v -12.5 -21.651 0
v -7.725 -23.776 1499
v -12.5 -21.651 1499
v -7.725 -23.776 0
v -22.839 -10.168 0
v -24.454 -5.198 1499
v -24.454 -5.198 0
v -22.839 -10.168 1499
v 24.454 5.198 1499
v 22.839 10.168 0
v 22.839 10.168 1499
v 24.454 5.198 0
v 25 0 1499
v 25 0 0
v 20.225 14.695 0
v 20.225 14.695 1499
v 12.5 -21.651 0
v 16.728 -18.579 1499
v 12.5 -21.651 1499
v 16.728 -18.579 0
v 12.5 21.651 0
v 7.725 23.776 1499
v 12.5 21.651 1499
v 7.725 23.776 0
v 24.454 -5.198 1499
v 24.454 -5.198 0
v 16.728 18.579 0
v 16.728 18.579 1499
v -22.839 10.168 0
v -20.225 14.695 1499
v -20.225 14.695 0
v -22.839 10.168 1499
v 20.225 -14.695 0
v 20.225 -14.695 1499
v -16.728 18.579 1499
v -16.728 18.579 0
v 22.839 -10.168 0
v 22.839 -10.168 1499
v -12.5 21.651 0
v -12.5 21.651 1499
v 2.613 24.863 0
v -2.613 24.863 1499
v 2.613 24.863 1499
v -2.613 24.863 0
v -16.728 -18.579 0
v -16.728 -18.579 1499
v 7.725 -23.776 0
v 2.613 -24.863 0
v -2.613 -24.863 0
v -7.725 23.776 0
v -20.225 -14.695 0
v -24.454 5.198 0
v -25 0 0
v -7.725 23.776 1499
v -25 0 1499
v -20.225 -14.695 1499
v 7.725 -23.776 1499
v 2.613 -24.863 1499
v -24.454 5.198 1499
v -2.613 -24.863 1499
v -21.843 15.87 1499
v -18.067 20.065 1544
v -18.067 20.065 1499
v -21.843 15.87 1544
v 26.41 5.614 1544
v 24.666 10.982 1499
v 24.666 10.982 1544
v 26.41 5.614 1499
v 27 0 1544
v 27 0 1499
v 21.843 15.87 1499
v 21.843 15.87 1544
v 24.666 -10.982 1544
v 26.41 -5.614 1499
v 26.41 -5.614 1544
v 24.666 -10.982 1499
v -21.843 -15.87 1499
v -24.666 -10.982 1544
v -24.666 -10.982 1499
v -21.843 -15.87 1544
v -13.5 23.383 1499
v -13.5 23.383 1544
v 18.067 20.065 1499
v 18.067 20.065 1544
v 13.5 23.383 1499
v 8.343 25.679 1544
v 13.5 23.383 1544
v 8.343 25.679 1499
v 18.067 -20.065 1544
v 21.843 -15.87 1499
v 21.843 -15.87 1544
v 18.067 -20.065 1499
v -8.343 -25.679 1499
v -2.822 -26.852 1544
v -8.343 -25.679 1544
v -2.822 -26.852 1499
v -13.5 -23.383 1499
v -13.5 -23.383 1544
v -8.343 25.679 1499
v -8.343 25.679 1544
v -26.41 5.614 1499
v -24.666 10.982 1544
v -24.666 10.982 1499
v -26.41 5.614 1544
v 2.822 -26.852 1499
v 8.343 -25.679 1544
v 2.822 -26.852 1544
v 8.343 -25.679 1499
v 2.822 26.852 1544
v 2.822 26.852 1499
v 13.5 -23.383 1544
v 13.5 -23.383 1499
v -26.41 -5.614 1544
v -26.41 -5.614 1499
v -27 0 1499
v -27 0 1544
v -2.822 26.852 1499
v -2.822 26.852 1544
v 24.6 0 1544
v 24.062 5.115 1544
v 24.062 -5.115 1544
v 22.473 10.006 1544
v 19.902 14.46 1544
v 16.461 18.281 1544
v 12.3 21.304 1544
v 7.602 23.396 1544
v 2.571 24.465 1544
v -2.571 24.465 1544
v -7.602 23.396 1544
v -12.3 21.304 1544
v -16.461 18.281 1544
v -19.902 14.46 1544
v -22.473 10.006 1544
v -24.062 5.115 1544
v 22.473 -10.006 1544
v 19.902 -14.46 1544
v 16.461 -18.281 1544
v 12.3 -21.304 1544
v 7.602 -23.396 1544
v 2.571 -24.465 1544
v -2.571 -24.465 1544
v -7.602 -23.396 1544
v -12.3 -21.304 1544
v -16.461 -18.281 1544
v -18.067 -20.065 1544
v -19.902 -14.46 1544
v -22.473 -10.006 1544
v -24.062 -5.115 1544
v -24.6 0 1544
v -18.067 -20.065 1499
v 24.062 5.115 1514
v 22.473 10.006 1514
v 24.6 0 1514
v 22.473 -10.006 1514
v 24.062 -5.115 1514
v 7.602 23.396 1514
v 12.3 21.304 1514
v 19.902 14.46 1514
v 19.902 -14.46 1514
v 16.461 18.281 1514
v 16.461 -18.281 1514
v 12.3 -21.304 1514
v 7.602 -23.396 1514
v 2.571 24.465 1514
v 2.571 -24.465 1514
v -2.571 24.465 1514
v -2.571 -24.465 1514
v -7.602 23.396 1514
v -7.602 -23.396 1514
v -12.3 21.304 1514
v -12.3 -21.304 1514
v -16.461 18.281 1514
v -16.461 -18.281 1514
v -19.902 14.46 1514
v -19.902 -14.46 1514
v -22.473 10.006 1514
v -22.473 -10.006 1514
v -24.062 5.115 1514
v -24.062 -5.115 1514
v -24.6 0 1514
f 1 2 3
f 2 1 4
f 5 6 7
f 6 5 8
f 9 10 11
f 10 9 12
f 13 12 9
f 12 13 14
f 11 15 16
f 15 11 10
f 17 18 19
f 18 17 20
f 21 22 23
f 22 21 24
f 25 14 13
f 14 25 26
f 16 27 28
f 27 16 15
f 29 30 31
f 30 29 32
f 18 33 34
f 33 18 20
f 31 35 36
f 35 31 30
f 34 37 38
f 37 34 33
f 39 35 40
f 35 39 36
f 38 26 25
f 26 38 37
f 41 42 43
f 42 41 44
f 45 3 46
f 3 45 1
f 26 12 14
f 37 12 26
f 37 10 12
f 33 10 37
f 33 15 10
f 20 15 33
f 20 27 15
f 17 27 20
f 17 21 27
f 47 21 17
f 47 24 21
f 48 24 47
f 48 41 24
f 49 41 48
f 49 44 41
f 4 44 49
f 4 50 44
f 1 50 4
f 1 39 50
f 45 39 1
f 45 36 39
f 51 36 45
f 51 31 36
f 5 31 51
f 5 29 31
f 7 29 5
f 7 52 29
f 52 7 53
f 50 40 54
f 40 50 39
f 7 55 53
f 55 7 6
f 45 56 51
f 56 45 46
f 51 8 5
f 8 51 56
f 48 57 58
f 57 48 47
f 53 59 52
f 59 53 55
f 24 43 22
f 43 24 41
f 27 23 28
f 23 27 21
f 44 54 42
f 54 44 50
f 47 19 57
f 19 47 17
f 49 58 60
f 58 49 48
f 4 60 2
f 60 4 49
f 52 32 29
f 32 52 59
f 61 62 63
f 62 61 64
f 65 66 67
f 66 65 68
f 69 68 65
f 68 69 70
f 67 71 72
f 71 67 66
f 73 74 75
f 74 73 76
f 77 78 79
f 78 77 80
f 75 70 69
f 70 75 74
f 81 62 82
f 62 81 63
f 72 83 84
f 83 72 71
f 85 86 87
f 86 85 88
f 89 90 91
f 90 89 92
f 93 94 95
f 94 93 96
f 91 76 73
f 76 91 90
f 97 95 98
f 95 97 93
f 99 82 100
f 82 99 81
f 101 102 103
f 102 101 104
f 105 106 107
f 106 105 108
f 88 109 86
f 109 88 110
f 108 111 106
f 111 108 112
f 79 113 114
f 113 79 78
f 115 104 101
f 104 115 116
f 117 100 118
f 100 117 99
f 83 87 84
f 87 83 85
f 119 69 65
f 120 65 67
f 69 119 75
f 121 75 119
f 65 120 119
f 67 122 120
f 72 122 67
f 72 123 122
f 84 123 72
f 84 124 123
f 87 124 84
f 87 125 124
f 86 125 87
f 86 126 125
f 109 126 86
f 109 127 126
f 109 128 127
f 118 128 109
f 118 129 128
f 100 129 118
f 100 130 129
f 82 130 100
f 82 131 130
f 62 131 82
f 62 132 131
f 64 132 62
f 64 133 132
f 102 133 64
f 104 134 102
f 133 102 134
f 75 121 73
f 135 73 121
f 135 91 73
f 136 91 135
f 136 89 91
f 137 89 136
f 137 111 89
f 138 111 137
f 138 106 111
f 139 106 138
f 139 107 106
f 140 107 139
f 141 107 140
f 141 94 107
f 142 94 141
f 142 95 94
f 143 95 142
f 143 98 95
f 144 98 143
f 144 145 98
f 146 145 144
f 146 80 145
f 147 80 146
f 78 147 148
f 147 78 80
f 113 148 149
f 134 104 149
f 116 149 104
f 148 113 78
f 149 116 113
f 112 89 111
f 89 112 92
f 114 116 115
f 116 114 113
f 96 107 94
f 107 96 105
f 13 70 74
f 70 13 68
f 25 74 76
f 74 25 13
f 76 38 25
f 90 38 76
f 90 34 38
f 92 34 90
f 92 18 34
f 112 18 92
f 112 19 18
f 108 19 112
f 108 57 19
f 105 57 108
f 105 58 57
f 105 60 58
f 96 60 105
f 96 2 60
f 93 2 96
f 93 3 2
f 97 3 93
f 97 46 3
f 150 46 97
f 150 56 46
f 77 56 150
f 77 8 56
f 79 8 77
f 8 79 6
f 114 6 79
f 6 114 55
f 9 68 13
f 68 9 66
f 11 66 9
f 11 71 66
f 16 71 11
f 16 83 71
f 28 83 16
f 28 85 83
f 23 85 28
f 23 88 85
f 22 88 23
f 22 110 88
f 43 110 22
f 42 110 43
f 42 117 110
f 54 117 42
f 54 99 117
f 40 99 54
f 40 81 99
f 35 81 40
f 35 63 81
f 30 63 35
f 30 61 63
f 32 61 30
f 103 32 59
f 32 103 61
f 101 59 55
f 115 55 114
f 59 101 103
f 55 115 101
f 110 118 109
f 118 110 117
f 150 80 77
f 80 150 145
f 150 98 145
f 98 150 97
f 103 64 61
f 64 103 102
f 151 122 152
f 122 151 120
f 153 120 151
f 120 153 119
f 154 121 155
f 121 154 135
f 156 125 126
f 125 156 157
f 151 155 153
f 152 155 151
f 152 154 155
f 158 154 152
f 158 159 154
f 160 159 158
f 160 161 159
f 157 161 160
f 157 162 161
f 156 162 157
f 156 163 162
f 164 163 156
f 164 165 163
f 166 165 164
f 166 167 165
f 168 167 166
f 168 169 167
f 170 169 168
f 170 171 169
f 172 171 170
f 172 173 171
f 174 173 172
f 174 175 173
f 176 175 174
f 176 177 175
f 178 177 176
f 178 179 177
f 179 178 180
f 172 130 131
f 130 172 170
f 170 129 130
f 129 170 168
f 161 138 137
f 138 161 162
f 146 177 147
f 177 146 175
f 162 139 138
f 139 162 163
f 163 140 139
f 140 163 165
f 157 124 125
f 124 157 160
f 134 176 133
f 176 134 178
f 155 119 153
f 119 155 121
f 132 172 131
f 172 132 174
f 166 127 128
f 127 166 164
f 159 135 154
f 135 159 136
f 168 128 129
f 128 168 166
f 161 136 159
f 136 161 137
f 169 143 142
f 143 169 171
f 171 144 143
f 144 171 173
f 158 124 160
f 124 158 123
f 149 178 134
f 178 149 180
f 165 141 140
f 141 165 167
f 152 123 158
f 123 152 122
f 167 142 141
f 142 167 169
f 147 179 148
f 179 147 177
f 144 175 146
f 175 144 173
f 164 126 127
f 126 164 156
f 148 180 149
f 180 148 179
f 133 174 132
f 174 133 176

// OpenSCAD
// Parameters
pipe_standard = 1; //[1:1:1]
nominal_diameter_mm = 50; //[25:100:1]
length_mm = 1500; //[750:3000:10]
pipe_wall_mm = 2.4; //[1.2:4.8:0.1]
pipe_od_mm = 50; //[25:100:1]
fitting_length_mm = 45; //[20:90:1]
fitting_wall_extra_mm = 2.0; //[1.0:6.0:0.5]
fitting_socket_depth_mm = 30; //[10:70:1]
overlap_mm = 1; //[0.5:2:0.5]

// HT Pipe - complete geometry
module ht_pipe() {
  color([0.85, 0.85, 0.8]) {
    // Pipe body
    difference() {
      cylinder(h=length_mm, r=pipe_od_mm/2, center=false);
      translate([0, 0, -overlap_mm])
        cylinder(h=length_mm + 2*overlap_mm, r=pipe_od_mm/2 - pipe_wall_mm, center=false);
    }
    
    // End fitting
    difference() {
      union() {
        translate([0, 0, length_mm - overlap_mm])
          cylinder(h=fitting_length_mm, r=pipe_od_mm/2 + fitting_wall_extra_mm, center=false);
        // Ensure solid connection with pipe body
        translate([0, 0, 0])
          cylinder(h=length_mm, r=pipe_od_mm/2, center=false);
      }
      translate([0, 0, length_mm + fitting_length_mm - fitting_socket_depth_mm - overlap_mm])
        cylinder(h=fitting_socket_depth_mm + 2*overlap_mm, r=pipe_od_mm/2 + fitting_wall_extra_mm - pipe_wall_mm, center=false);
    }
  }
}

// Assembly
module assembly() {
  ht_pipe();
}

assembly();
